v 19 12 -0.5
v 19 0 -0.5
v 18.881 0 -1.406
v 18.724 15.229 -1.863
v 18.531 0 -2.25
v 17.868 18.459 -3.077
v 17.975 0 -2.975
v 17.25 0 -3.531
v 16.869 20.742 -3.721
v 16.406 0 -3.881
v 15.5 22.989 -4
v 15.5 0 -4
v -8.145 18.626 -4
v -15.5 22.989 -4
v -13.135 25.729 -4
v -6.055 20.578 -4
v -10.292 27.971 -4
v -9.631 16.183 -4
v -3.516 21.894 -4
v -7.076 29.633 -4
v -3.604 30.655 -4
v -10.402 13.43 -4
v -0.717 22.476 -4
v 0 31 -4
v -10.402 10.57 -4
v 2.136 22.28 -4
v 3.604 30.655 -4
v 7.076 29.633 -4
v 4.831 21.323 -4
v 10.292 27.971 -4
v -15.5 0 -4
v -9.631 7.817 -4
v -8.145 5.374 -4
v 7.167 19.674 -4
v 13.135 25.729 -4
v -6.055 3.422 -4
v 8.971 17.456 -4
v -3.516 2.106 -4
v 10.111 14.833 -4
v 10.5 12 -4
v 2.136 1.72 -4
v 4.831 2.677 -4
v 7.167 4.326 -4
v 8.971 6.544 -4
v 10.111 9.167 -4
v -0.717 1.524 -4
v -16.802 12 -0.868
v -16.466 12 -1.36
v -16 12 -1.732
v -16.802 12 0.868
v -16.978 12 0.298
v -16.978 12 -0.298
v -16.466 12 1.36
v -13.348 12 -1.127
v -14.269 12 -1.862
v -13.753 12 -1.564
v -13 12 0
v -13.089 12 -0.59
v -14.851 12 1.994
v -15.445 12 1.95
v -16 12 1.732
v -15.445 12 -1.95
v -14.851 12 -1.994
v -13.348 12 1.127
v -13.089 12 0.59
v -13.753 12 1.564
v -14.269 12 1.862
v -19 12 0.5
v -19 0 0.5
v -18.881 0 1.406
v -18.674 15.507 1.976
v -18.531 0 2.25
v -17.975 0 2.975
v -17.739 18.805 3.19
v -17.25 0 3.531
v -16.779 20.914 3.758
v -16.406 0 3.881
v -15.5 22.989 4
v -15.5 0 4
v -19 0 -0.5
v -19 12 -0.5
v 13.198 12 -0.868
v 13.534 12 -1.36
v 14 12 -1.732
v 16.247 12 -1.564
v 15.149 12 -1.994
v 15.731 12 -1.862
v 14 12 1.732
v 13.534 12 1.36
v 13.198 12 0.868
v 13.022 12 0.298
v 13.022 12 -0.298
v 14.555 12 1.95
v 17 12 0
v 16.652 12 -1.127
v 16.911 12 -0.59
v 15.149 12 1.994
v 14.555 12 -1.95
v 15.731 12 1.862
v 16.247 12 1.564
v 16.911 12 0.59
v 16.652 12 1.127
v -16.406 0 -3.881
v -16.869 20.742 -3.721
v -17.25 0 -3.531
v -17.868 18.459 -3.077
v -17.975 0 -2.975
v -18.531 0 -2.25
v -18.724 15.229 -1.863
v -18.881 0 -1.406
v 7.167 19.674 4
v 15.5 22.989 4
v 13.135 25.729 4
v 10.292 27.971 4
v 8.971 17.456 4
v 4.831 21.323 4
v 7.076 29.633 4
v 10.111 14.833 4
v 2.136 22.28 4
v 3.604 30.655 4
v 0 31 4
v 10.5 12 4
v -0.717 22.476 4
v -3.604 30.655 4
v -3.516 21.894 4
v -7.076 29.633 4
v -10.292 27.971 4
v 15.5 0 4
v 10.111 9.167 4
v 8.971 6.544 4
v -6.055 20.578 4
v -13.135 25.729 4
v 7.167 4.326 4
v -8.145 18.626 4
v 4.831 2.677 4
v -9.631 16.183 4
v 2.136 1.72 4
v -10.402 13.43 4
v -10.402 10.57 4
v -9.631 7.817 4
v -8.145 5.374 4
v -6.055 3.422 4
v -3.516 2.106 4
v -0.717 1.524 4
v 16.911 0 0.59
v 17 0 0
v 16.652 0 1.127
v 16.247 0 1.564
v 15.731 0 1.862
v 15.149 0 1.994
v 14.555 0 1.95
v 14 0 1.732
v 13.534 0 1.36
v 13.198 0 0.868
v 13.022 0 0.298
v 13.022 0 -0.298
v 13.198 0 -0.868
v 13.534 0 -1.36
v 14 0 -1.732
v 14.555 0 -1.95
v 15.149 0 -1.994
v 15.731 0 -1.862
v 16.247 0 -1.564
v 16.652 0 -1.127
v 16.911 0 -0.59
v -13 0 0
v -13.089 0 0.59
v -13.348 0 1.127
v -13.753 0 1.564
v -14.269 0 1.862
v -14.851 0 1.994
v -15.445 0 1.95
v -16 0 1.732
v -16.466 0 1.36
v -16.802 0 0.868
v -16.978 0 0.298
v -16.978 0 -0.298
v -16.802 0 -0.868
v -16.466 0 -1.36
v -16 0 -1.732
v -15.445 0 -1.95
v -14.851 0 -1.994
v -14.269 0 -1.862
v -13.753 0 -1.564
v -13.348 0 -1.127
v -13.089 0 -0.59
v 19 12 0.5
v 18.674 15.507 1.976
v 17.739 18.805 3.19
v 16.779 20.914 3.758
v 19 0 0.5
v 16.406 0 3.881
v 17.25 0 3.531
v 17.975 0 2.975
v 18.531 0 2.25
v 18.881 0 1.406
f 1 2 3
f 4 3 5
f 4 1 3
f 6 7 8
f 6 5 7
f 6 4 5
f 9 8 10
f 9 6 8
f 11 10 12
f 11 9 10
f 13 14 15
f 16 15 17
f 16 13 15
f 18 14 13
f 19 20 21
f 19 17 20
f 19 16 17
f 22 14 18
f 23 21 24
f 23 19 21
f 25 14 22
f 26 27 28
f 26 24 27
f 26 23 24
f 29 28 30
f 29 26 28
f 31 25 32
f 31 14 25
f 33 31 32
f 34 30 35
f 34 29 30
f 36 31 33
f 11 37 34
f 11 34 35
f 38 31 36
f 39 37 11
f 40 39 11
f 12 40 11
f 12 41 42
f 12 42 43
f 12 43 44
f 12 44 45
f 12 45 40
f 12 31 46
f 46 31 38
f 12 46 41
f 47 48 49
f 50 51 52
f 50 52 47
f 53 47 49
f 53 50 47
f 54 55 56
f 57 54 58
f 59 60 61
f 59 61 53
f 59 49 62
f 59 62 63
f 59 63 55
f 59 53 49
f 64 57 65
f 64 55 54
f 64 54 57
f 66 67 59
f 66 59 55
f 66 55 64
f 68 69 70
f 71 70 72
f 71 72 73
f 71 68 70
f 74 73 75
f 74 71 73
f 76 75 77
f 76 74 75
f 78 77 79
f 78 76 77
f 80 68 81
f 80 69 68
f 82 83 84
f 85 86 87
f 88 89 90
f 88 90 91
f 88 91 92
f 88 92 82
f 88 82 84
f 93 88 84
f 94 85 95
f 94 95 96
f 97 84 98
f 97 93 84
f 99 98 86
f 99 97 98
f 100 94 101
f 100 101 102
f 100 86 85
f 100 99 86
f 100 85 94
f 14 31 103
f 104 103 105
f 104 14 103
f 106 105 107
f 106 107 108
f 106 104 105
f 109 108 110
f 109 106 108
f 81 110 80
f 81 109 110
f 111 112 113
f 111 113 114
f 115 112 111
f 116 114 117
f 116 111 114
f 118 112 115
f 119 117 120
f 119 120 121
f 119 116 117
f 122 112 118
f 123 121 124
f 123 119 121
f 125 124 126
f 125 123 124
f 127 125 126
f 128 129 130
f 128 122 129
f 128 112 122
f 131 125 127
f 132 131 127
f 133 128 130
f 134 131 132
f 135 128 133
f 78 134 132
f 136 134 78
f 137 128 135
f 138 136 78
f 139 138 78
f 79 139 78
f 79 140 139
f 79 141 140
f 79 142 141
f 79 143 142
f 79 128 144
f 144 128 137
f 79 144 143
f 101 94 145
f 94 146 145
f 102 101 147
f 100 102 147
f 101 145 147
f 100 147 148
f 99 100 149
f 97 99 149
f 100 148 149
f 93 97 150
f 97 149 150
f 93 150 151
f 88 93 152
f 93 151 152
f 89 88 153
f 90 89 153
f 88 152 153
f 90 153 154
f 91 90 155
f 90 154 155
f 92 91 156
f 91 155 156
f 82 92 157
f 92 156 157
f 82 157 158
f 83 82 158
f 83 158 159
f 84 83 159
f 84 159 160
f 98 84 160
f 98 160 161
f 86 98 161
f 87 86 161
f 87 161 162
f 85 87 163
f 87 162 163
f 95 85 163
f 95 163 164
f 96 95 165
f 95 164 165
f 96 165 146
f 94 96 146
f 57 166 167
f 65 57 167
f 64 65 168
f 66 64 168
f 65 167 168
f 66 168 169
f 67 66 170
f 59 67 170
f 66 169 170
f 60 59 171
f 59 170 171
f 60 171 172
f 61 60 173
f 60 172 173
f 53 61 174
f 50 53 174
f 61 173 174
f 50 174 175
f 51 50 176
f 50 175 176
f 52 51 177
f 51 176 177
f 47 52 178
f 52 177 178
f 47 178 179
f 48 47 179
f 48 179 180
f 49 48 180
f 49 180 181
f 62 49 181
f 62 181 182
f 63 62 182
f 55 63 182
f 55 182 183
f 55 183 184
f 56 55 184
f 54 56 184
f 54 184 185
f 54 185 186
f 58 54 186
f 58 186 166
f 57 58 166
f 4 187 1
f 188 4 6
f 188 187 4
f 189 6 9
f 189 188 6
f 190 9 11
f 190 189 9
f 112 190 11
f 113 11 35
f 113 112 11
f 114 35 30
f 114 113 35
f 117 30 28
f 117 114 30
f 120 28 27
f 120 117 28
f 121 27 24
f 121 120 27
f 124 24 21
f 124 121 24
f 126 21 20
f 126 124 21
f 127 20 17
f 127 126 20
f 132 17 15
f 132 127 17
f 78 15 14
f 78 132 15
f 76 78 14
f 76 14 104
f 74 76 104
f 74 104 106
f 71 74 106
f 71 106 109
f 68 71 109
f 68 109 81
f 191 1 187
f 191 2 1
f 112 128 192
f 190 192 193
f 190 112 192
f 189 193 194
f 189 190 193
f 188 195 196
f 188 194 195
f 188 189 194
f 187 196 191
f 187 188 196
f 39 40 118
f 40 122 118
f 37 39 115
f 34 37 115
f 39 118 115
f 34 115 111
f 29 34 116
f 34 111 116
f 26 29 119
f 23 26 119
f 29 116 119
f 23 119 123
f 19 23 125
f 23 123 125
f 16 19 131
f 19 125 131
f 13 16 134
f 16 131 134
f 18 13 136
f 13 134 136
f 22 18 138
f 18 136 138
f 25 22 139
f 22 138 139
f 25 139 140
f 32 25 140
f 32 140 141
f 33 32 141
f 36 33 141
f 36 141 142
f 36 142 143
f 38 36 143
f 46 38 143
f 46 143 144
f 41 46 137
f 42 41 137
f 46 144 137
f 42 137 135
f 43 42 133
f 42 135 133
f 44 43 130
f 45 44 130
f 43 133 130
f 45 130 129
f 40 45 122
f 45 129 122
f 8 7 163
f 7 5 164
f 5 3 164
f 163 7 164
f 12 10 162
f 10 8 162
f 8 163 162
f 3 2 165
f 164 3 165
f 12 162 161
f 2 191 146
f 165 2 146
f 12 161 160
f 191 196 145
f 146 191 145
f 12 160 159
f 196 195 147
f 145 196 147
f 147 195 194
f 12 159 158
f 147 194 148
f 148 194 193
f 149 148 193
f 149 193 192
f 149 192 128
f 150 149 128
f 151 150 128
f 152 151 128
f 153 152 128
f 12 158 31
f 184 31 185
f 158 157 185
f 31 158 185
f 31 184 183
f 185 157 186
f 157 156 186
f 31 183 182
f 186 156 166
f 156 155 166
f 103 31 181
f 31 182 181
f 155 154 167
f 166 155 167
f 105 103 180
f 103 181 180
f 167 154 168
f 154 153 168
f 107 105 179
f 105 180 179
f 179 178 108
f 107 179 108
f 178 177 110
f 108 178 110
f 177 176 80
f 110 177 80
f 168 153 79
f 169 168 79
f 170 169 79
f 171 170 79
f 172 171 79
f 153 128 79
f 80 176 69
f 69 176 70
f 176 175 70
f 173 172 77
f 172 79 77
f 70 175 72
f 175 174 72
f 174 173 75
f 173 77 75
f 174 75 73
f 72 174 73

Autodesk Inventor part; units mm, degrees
ref_plane "YZ Plane" through (0, 0, 0) normal (1, 0, 0) x (0, 1, 0)
ref_plane "XZ Plane" through (0, 0, 0) normal (0, 1, 0) x (-1, 0, 0)
ref_plane "XY Plane" through (0, 0, 0) normal (0, 0, 1) x (1, 0, 0)
sketch "Эскиз1" plane through (0, 0, 0) normal (1, 0, 0) x (0, 1, 0)
  point P0 (0, 0)
sketch "Эскиз2" plane through (0, 0, 0) normal (0, 1, 0) x (-1, 0, 0)
  line L0 (19, -4) -> (-19, -4)
  line L1 (-19, -4) -> (-19, 4)
  line L2 (-19, 4) -> (19, 4)
  line L3 (19, 4) -> (19, -4)
  line L4 (19, -4) -> (-19, 4) construction
  line L5 (-19, -4) -> (19, 4) construction
  line L6 (19, 0) -> (-19, 0) construction
  circle A0 centre (-15, 0) radius 2
  line L7 (0, -4) -> (0, 4) construction
  circle A1 centre (15, 0) radius 2
  point P0 (0, 0)
  dimension "d1" = 30
  dimension "d2" = 4
  dimension "d3" = 38
  dimension "d4" = 8
extrude "Выдавливание1" add sketch "Эскиз2" along normal blind 35 contours L0 L1 L2 L3 | A0 | A1
fillet "Сопряжение1" radius 3.5 4 edges at (19, 17.5, 4) (19, 17.5, -4) (-19, 17.5, 4) (-19, 17.5, -4)
sketch "Эскиз3" plane through (-15.5, 0, 4) normal (0, 0, 1) x (1, 0, 0)
  line L0 (29, 35) -> (29, 0) construction
  line L1 (0, 0) -> (0, 35) construction
  line L2 (0, 0) -> (31, 0) construction
  line L3 (31, 35) -> (31, 0) construction
  line L4 (0, 35) -> (31, 35) construction
  line L5 (32, 35) -> (32, 0) construction
  line L6 (34.5, 35) -> (31, 35) construction
  line L7 (31, 35) -> (31, 0) construction
  line L8 (31, 0) -> (34.5, 0) construction
  line L9 (34.5, 0) -> (34.5, 35) construction
  line L10 (-1, 35) -> (-1, 0) construction
  line L11 (0, 35) -> (-3.5, 35) construction
  line L12 (-3.5, 35) -> (-3.5, 0) construction
  line L13 (-3.5, 0) -> (0, 0) construction
  line L14 (0, 0) -> (0, 35) construction
  line L15 (0, 0) -> (0, 35) construction
  line L16 (-1, 35) -> (2, 35) construction
  line L17 (29, 35) -> (32, 35) construction
  line L18 (29, 0) -> (32, 0) construction
  line L19 (-1, 35) -> (2, 35) construction
  line L20 (-1, 0) -> (2, 0) construction
  line L21 (-1, 35) -> (2, 35) construction
  line L22 (-1, 0) -> (2, 0) construction
  line L23 (2, 35) -> (2, 0) construction
  line L24 (29, 35) -> (2, 0) construction
  line L25 (2, 35) -> (29, 0) construction
  line L26 (15.5, 17.5) -> (15.5, 35) construction
  line L27 (0, 35) -> (31, 35) construction
  circle A0 centre (15.5, 12) radius 10.5
  point P0 (15.5, 0)
  dimension "d8" = 21
  dimension "d9" = 12
extrude "Выдавливание2" cut sketch "Эскиз3" against normal blind 35
sketch "Эскиз4" plane through (-15.5, 0, 4) normal (0, 0, 1) x (1, 0, 0)
  circle A0 centre (15.5, 12) radius 10.5 construction
  circle A1 centre (15.5, 12) radius 10.5 construction
  line L0 (0, 0) -> (0, 35) construction
  line L1 (0, 0) -> (31, 0) construction
  line L2 (31, 35) -> (31, 0) construction
  line L3 (0, 35) -> (31, 35) construction
  line L4 (-1, 35) -> (-1, 0) construction
  line L5 (0, 35) -> (-3.5, 35) construction
  line L6 (-3.5, 35) -> (-3.5, 0) construction
  line L7 (-3.5, 0) -> (0, 0) construction
  line L8 (0, 0) -> (0, 35) construction
  line L9 (34.5, 35) -> (31, 35) construction
  line L10 (31, 35) -> (31, 0) construction
  line L11 (31, 0) -> (34.5, 0) construction
  line L12 (34.5, 0) -> (34.5, 35) construction
  arc A2 (-1, 2.5793) -> (34.5, 12) centre (15.5, 12) ccw construction
  line L13 (-3.5, 0) -> (-3.5, 35) construction
  line L14 (34.5, 0) -> (34.5, 35) construction
  arc A3 (-3.5, 12) -> (-1, 2.5793) centre (15.5, 12) ccw construction
  arc A4 (34.5, 12) -> (-3.5, 12) centre (15.5, 12) ccw
  line L15 (-3.5, 12) -> (-17.3538, 35.9689)
  line L16 (-17.3538, 35.9689) -> (7.0238, 39.959)
  line L17 (7.0238, 39.959) -> (47.0337, 39.6857)
  line L18 (47.0337, 39.6857) -> (34.5, 12)
  point P0 (15.5, 0)
extrude "Выдавливание3" cut sketch "Эскиз4" against normal blind 35
sketch "Эскиз5" plane through (0, 0, 0) normal (0, -1, 0) x (1, 0, 0)
  circle A0 centre (-15, 0) radius 2 projected
  circle A1 centre (15, 0) radius 2 projected
  point P0 (0, 0)
extrude "Выдавливание4" cut sketch "Эскиз5" against normal blind 12
properties part number "mid_mount_v2" material "Пластик АБС"
